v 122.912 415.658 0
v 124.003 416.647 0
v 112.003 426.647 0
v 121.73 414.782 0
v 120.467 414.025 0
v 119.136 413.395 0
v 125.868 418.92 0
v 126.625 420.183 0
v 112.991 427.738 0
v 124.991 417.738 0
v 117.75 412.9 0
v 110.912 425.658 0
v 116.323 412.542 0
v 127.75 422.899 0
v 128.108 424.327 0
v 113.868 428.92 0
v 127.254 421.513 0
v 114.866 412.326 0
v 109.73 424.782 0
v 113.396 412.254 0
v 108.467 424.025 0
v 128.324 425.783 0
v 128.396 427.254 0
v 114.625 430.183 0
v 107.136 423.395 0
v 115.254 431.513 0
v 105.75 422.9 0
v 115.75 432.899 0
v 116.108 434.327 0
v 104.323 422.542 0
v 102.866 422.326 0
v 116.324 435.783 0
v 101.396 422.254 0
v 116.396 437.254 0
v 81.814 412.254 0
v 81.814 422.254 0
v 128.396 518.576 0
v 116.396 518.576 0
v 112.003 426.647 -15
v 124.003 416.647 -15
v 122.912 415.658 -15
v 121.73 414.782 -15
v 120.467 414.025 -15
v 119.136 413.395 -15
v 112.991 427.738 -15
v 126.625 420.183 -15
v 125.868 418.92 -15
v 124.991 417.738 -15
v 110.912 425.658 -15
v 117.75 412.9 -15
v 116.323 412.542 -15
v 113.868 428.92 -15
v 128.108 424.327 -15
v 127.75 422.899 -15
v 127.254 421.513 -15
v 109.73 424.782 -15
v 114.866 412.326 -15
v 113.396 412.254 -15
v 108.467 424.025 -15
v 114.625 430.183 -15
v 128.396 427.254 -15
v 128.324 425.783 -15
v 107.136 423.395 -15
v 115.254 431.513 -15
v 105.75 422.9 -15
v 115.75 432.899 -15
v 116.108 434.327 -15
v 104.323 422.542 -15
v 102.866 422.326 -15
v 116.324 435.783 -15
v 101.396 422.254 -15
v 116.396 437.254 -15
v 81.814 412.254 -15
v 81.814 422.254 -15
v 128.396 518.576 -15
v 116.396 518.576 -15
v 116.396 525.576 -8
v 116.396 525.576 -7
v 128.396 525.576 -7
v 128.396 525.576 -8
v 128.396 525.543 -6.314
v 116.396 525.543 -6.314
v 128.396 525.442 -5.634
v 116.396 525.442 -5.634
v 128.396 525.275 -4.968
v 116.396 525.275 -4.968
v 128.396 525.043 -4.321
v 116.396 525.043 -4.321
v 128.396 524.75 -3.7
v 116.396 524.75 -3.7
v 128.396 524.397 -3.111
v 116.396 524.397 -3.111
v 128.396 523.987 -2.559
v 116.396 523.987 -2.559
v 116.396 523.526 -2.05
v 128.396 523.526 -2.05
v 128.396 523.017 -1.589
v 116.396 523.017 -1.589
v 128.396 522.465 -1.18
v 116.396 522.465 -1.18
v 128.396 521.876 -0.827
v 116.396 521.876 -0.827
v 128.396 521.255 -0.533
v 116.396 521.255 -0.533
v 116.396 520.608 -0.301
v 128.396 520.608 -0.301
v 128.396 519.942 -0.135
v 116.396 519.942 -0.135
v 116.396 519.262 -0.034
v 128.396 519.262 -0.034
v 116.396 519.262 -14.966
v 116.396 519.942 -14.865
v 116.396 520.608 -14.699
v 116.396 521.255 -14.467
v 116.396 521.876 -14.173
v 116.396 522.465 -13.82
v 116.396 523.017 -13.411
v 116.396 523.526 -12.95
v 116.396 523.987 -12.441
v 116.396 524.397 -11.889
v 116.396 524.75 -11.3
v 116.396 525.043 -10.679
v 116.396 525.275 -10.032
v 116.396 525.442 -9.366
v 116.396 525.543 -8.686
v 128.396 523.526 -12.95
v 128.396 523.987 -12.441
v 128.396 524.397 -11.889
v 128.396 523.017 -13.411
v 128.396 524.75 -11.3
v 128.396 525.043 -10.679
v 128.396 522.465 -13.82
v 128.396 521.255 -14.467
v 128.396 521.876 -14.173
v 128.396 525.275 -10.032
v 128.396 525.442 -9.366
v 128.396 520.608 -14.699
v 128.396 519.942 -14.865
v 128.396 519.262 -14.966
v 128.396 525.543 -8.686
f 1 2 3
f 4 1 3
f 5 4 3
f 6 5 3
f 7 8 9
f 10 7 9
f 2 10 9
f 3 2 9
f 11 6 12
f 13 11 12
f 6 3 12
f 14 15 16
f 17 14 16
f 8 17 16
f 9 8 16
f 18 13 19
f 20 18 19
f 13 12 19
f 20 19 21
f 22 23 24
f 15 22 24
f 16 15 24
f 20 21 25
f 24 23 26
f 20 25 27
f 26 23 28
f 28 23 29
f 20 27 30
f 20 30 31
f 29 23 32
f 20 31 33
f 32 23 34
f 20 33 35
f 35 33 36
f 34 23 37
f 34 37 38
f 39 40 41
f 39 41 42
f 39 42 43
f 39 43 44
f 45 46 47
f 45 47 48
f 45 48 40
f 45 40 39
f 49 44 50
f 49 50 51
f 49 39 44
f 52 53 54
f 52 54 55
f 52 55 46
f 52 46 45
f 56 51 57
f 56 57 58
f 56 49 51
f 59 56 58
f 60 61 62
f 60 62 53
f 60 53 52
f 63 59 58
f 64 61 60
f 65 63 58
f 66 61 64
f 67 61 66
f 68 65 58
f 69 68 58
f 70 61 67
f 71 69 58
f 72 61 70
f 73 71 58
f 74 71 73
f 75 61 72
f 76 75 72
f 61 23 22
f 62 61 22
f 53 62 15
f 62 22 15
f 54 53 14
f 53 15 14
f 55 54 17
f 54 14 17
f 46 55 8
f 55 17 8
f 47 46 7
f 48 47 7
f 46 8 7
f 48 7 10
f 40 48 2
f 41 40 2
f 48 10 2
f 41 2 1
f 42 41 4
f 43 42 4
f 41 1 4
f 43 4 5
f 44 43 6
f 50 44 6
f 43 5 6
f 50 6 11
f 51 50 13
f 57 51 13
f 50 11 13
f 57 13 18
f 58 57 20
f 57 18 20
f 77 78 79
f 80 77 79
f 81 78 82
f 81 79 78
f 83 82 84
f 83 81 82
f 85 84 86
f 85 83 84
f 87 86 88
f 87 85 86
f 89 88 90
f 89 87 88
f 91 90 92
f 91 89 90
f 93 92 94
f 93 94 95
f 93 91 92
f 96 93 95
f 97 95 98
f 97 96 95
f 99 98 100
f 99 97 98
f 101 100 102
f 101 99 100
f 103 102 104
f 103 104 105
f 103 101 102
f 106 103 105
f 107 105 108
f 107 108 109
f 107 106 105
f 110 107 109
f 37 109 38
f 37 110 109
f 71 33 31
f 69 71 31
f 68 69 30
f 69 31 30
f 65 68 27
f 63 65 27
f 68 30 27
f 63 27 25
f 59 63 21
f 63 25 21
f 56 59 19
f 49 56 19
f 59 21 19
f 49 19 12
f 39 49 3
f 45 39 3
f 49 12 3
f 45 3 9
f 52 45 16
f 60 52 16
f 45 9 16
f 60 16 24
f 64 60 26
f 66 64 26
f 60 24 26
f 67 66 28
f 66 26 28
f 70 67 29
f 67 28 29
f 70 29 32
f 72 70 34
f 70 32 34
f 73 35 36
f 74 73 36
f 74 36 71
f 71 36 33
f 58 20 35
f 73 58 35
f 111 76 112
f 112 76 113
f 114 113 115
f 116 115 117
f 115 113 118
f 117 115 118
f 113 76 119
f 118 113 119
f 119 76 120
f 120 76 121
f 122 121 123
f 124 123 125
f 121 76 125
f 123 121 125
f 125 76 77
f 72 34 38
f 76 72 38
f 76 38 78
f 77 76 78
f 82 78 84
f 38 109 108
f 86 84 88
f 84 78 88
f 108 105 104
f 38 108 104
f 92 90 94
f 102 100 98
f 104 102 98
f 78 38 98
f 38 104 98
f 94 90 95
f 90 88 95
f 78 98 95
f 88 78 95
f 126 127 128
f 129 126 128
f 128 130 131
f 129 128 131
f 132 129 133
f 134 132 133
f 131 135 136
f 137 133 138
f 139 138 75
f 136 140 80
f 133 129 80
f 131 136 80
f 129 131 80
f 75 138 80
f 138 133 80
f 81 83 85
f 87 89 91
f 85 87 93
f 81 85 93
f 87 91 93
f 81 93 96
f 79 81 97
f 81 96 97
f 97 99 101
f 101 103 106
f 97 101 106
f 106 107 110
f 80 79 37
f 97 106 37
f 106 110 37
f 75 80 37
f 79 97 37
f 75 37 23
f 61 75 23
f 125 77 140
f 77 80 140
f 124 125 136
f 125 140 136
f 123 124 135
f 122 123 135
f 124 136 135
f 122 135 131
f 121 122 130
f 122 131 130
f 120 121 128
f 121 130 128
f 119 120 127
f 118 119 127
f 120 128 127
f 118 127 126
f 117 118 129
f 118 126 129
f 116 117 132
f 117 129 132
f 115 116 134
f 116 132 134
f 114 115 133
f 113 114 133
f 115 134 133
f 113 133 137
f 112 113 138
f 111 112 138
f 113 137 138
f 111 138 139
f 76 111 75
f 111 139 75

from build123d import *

# Parameters (mm, degrees)
BOSS_EXTRUDE1_DEPTH = 15
FILLET1_R           = 7


with BuildPart() as part:
    # Sketch1 → Boss-Extrude1 (new body)
    with BuildSketch(Plane.XY):
        with BuildLine():
            Line((81.814228499, 422.253610621), (101.396155955, 422.253610621))
            ThreePointArc((101.396155955, 422.253610621), (112.002757673, 426.647008903), (116.396155955, 437.253610621))
            Line((116.396155955, 437.253610621), (116.396155955, 525.576232013))
            Line((116.396155955, 525.576232013), (128.396155955, 525.576232013))
            Line((128.396155955, 525.576232013), (128.396155955, 427.253610621))
            ThreePointArc((128.396155955, 427.253610621), (124.002757673, 416.647008903), (113.396155955, 412.253610621))
            Line((113.396155955, 412.253610621), (81.814228499, 412.253610621))
            Line((81.814228499, 412.253610621), (81.814228499, 422.253610621))
        make_face()
    extrude(amount=-BOSS_EXTRUDE1_DEPTH)

    # Fillet1
    fillet1_edges = [part.edges().sort_by_distance(p)[0] for p in [
        (122.396155955, 525.576232013, -15),
        (122.396155955, 525.576232013, 0),
    ]]
    fillet(fillet1_edges, radius=FILLET1_R)


solid = part.part
